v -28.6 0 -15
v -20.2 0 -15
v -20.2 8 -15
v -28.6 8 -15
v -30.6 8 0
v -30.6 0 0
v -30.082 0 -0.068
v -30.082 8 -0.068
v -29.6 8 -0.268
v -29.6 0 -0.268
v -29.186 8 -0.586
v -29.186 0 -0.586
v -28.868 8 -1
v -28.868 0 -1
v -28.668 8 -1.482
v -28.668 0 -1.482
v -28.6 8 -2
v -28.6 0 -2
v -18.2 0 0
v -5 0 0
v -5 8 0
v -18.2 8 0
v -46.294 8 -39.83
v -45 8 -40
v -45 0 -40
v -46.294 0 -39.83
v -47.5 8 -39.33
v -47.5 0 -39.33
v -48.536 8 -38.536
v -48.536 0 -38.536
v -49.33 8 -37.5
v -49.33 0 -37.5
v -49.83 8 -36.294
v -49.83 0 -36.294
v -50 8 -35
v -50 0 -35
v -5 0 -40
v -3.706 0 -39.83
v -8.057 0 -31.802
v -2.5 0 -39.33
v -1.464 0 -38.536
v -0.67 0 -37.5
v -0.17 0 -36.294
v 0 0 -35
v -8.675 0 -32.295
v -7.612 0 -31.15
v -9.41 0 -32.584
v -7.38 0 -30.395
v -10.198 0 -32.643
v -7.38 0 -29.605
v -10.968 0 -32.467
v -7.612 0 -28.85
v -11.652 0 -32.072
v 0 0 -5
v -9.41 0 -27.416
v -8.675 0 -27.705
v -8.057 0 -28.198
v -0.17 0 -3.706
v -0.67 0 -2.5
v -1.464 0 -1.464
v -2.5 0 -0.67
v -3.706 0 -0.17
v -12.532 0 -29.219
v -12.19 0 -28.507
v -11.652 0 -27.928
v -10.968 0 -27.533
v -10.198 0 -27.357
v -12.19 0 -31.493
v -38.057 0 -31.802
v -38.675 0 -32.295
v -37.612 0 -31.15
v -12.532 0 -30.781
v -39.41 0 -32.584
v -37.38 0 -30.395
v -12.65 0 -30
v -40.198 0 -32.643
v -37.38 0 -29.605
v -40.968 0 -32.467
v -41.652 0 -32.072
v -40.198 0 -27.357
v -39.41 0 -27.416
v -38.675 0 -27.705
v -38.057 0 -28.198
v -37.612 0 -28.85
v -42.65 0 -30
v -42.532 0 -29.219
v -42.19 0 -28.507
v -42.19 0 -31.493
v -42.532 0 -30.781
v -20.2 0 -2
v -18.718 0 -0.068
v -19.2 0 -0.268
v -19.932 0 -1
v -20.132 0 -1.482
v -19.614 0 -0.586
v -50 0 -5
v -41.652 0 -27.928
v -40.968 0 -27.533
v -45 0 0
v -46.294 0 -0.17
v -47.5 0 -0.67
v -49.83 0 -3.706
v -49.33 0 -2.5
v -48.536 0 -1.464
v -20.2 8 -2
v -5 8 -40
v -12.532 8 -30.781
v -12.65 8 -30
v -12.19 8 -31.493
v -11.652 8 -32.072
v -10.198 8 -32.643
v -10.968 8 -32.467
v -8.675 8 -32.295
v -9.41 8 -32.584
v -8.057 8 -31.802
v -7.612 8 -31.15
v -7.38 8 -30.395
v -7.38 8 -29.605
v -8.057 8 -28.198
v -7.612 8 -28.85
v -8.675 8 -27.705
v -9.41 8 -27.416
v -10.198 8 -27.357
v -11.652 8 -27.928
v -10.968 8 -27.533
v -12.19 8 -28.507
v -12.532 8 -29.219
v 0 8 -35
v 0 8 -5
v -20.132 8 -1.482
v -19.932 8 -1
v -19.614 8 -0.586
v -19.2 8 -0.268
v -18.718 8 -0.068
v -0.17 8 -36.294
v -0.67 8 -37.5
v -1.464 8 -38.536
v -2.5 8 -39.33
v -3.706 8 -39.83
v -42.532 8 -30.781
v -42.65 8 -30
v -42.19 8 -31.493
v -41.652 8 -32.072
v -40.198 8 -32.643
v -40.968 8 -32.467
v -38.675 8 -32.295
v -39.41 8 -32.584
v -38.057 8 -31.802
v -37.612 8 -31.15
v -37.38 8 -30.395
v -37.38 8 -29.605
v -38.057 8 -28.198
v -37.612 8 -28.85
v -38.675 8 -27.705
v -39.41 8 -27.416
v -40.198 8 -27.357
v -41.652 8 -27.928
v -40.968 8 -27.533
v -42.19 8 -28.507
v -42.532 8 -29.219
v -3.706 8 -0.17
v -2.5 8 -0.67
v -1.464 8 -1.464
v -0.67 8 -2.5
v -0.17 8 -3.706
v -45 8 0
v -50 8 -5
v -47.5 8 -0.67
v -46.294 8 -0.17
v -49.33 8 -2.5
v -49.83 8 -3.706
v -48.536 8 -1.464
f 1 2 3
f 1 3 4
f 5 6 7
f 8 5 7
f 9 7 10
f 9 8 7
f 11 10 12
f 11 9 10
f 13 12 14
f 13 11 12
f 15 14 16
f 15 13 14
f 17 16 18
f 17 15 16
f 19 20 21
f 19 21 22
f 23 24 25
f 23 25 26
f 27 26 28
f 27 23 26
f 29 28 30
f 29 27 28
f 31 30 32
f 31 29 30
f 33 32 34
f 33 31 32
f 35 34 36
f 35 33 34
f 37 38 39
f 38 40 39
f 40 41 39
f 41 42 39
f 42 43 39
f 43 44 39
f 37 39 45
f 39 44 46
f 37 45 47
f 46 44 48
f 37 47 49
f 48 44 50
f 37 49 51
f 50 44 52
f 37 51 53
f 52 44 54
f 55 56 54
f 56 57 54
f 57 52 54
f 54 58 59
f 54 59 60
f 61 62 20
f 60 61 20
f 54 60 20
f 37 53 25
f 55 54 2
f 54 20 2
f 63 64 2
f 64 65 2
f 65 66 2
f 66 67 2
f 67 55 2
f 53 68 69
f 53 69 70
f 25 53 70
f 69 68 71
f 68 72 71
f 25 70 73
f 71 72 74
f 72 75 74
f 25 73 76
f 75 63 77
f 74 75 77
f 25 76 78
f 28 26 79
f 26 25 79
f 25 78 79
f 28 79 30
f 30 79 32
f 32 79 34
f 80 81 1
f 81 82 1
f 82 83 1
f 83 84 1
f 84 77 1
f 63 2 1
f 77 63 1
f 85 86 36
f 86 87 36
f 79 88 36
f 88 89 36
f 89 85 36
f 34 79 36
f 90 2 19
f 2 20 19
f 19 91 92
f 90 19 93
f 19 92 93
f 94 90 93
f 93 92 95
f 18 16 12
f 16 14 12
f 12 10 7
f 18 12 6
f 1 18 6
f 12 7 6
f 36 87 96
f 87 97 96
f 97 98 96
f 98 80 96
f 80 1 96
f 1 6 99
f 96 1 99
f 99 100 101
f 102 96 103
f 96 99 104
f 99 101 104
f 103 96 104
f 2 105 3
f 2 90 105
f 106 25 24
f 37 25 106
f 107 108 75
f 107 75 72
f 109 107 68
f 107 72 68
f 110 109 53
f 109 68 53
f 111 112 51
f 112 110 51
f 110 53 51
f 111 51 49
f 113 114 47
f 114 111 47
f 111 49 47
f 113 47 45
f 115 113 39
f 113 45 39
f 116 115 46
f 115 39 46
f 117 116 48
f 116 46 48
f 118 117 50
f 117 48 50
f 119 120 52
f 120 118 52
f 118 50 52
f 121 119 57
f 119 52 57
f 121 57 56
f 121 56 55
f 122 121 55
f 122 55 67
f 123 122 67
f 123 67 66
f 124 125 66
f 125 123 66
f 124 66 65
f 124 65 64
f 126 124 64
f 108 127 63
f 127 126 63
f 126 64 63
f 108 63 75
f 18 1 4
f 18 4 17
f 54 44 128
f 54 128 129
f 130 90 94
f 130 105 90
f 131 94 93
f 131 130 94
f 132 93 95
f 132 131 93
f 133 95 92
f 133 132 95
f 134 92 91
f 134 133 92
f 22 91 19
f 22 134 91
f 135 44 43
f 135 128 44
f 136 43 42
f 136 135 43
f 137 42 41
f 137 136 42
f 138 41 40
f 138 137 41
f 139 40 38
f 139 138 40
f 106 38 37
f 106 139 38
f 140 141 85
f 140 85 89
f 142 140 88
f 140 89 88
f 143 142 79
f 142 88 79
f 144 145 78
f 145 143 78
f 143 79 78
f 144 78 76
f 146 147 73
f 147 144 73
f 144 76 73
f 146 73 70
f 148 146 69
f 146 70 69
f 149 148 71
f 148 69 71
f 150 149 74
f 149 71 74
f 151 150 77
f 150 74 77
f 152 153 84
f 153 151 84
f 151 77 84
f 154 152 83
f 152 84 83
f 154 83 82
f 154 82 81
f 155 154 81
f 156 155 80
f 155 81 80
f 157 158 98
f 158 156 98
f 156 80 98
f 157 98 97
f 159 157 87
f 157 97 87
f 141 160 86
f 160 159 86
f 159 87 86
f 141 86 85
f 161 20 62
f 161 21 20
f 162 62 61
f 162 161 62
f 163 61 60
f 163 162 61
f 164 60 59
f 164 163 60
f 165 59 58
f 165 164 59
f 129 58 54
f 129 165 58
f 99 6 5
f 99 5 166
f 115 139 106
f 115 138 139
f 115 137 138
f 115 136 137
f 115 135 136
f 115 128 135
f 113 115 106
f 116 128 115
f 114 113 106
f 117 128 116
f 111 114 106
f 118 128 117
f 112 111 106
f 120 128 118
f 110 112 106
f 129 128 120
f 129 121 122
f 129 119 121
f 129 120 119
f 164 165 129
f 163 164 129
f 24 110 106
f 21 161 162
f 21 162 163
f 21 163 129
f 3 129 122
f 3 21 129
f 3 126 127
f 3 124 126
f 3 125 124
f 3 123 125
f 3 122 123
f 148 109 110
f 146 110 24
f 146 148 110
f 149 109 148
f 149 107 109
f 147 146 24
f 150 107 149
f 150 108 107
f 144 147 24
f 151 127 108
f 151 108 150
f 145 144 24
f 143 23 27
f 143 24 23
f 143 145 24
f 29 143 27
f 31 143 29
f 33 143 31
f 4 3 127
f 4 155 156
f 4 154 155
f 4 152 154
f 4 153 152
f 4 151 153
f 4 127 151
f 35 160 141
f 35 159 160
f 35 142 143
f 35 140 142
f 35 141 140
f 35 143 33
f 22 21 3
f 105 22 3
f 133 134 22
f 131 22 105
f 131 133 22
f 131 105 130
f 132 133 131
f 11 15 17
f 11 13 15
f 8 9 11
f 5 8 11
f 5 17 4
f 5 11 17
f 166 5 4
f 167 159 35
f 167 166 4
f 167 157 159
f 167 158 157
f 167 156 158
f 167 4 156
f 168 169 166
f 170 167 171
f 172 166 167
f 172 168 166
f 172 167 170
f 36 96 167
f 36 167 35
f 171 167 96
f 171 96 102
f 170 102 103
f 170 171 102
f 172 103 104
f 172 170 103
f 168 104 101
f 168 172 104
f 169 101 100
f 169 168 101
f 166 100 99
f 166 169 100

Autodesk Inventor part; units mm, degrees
ref_plane "YZ Plane" through (0, 0, 0) normal (1, 0, 0) x (0, 1, 0)
ref_plane "XZ Plane" through (0, 0, 0) normal (0, 1, 0) x (-1, 0, 0)
ref_plane "XY Plane" through (0, 0, 0) normal (0, 0, 1) x (1, 0, 0)
sketch "Sketch1" plane through (0, 0, 0) normal (0, 1, 0) x (-1, 0, 0)
  line L0 (0, 0) -> (20.2, 0)
  line L1 (50, 0) -> (50, -40)
  line L2 (50, -40) -> (0, -40)
  line L3 (0, -40) -> (0, 0)
  line L4 (20.2, 0) -> (20.2, -15)
  line L5 (20.2, -15) -> (28.6, -15)
  line L6 (28.6, -15) -> (28.6, 0)
  circle A0 centre (40, -30) radius 2.65
  circle A1 centre (10, -30) radius 2.65
  line L7 (28.6, 0) -> (50, 0)
  dimension "d0" = 40
  dimension "d1" = 50
  dimension "d2" = 8.4
  dimension "d3" = 15
  dimension "d4" = 20.2
  dimension "d5" = 5.3
  dimension "d6" = 5.3
  dimension "d7" = 10
  dimension "d8" = 10
  dimension "d9" = 10
  dimension "d10" = 10
extrude "Extrusion1" add sketch "Sketch1" along normal blind 8
fillet "Fillet1" radius 5 4 edges at (0, 4, -40) (-50, 4, -40) (0, 4, 0) (-50, 4, 0)
fillet "Fillet2" radius 2 2 edges at (-28.6, 4, 0) (-20.2, 4, 0)
